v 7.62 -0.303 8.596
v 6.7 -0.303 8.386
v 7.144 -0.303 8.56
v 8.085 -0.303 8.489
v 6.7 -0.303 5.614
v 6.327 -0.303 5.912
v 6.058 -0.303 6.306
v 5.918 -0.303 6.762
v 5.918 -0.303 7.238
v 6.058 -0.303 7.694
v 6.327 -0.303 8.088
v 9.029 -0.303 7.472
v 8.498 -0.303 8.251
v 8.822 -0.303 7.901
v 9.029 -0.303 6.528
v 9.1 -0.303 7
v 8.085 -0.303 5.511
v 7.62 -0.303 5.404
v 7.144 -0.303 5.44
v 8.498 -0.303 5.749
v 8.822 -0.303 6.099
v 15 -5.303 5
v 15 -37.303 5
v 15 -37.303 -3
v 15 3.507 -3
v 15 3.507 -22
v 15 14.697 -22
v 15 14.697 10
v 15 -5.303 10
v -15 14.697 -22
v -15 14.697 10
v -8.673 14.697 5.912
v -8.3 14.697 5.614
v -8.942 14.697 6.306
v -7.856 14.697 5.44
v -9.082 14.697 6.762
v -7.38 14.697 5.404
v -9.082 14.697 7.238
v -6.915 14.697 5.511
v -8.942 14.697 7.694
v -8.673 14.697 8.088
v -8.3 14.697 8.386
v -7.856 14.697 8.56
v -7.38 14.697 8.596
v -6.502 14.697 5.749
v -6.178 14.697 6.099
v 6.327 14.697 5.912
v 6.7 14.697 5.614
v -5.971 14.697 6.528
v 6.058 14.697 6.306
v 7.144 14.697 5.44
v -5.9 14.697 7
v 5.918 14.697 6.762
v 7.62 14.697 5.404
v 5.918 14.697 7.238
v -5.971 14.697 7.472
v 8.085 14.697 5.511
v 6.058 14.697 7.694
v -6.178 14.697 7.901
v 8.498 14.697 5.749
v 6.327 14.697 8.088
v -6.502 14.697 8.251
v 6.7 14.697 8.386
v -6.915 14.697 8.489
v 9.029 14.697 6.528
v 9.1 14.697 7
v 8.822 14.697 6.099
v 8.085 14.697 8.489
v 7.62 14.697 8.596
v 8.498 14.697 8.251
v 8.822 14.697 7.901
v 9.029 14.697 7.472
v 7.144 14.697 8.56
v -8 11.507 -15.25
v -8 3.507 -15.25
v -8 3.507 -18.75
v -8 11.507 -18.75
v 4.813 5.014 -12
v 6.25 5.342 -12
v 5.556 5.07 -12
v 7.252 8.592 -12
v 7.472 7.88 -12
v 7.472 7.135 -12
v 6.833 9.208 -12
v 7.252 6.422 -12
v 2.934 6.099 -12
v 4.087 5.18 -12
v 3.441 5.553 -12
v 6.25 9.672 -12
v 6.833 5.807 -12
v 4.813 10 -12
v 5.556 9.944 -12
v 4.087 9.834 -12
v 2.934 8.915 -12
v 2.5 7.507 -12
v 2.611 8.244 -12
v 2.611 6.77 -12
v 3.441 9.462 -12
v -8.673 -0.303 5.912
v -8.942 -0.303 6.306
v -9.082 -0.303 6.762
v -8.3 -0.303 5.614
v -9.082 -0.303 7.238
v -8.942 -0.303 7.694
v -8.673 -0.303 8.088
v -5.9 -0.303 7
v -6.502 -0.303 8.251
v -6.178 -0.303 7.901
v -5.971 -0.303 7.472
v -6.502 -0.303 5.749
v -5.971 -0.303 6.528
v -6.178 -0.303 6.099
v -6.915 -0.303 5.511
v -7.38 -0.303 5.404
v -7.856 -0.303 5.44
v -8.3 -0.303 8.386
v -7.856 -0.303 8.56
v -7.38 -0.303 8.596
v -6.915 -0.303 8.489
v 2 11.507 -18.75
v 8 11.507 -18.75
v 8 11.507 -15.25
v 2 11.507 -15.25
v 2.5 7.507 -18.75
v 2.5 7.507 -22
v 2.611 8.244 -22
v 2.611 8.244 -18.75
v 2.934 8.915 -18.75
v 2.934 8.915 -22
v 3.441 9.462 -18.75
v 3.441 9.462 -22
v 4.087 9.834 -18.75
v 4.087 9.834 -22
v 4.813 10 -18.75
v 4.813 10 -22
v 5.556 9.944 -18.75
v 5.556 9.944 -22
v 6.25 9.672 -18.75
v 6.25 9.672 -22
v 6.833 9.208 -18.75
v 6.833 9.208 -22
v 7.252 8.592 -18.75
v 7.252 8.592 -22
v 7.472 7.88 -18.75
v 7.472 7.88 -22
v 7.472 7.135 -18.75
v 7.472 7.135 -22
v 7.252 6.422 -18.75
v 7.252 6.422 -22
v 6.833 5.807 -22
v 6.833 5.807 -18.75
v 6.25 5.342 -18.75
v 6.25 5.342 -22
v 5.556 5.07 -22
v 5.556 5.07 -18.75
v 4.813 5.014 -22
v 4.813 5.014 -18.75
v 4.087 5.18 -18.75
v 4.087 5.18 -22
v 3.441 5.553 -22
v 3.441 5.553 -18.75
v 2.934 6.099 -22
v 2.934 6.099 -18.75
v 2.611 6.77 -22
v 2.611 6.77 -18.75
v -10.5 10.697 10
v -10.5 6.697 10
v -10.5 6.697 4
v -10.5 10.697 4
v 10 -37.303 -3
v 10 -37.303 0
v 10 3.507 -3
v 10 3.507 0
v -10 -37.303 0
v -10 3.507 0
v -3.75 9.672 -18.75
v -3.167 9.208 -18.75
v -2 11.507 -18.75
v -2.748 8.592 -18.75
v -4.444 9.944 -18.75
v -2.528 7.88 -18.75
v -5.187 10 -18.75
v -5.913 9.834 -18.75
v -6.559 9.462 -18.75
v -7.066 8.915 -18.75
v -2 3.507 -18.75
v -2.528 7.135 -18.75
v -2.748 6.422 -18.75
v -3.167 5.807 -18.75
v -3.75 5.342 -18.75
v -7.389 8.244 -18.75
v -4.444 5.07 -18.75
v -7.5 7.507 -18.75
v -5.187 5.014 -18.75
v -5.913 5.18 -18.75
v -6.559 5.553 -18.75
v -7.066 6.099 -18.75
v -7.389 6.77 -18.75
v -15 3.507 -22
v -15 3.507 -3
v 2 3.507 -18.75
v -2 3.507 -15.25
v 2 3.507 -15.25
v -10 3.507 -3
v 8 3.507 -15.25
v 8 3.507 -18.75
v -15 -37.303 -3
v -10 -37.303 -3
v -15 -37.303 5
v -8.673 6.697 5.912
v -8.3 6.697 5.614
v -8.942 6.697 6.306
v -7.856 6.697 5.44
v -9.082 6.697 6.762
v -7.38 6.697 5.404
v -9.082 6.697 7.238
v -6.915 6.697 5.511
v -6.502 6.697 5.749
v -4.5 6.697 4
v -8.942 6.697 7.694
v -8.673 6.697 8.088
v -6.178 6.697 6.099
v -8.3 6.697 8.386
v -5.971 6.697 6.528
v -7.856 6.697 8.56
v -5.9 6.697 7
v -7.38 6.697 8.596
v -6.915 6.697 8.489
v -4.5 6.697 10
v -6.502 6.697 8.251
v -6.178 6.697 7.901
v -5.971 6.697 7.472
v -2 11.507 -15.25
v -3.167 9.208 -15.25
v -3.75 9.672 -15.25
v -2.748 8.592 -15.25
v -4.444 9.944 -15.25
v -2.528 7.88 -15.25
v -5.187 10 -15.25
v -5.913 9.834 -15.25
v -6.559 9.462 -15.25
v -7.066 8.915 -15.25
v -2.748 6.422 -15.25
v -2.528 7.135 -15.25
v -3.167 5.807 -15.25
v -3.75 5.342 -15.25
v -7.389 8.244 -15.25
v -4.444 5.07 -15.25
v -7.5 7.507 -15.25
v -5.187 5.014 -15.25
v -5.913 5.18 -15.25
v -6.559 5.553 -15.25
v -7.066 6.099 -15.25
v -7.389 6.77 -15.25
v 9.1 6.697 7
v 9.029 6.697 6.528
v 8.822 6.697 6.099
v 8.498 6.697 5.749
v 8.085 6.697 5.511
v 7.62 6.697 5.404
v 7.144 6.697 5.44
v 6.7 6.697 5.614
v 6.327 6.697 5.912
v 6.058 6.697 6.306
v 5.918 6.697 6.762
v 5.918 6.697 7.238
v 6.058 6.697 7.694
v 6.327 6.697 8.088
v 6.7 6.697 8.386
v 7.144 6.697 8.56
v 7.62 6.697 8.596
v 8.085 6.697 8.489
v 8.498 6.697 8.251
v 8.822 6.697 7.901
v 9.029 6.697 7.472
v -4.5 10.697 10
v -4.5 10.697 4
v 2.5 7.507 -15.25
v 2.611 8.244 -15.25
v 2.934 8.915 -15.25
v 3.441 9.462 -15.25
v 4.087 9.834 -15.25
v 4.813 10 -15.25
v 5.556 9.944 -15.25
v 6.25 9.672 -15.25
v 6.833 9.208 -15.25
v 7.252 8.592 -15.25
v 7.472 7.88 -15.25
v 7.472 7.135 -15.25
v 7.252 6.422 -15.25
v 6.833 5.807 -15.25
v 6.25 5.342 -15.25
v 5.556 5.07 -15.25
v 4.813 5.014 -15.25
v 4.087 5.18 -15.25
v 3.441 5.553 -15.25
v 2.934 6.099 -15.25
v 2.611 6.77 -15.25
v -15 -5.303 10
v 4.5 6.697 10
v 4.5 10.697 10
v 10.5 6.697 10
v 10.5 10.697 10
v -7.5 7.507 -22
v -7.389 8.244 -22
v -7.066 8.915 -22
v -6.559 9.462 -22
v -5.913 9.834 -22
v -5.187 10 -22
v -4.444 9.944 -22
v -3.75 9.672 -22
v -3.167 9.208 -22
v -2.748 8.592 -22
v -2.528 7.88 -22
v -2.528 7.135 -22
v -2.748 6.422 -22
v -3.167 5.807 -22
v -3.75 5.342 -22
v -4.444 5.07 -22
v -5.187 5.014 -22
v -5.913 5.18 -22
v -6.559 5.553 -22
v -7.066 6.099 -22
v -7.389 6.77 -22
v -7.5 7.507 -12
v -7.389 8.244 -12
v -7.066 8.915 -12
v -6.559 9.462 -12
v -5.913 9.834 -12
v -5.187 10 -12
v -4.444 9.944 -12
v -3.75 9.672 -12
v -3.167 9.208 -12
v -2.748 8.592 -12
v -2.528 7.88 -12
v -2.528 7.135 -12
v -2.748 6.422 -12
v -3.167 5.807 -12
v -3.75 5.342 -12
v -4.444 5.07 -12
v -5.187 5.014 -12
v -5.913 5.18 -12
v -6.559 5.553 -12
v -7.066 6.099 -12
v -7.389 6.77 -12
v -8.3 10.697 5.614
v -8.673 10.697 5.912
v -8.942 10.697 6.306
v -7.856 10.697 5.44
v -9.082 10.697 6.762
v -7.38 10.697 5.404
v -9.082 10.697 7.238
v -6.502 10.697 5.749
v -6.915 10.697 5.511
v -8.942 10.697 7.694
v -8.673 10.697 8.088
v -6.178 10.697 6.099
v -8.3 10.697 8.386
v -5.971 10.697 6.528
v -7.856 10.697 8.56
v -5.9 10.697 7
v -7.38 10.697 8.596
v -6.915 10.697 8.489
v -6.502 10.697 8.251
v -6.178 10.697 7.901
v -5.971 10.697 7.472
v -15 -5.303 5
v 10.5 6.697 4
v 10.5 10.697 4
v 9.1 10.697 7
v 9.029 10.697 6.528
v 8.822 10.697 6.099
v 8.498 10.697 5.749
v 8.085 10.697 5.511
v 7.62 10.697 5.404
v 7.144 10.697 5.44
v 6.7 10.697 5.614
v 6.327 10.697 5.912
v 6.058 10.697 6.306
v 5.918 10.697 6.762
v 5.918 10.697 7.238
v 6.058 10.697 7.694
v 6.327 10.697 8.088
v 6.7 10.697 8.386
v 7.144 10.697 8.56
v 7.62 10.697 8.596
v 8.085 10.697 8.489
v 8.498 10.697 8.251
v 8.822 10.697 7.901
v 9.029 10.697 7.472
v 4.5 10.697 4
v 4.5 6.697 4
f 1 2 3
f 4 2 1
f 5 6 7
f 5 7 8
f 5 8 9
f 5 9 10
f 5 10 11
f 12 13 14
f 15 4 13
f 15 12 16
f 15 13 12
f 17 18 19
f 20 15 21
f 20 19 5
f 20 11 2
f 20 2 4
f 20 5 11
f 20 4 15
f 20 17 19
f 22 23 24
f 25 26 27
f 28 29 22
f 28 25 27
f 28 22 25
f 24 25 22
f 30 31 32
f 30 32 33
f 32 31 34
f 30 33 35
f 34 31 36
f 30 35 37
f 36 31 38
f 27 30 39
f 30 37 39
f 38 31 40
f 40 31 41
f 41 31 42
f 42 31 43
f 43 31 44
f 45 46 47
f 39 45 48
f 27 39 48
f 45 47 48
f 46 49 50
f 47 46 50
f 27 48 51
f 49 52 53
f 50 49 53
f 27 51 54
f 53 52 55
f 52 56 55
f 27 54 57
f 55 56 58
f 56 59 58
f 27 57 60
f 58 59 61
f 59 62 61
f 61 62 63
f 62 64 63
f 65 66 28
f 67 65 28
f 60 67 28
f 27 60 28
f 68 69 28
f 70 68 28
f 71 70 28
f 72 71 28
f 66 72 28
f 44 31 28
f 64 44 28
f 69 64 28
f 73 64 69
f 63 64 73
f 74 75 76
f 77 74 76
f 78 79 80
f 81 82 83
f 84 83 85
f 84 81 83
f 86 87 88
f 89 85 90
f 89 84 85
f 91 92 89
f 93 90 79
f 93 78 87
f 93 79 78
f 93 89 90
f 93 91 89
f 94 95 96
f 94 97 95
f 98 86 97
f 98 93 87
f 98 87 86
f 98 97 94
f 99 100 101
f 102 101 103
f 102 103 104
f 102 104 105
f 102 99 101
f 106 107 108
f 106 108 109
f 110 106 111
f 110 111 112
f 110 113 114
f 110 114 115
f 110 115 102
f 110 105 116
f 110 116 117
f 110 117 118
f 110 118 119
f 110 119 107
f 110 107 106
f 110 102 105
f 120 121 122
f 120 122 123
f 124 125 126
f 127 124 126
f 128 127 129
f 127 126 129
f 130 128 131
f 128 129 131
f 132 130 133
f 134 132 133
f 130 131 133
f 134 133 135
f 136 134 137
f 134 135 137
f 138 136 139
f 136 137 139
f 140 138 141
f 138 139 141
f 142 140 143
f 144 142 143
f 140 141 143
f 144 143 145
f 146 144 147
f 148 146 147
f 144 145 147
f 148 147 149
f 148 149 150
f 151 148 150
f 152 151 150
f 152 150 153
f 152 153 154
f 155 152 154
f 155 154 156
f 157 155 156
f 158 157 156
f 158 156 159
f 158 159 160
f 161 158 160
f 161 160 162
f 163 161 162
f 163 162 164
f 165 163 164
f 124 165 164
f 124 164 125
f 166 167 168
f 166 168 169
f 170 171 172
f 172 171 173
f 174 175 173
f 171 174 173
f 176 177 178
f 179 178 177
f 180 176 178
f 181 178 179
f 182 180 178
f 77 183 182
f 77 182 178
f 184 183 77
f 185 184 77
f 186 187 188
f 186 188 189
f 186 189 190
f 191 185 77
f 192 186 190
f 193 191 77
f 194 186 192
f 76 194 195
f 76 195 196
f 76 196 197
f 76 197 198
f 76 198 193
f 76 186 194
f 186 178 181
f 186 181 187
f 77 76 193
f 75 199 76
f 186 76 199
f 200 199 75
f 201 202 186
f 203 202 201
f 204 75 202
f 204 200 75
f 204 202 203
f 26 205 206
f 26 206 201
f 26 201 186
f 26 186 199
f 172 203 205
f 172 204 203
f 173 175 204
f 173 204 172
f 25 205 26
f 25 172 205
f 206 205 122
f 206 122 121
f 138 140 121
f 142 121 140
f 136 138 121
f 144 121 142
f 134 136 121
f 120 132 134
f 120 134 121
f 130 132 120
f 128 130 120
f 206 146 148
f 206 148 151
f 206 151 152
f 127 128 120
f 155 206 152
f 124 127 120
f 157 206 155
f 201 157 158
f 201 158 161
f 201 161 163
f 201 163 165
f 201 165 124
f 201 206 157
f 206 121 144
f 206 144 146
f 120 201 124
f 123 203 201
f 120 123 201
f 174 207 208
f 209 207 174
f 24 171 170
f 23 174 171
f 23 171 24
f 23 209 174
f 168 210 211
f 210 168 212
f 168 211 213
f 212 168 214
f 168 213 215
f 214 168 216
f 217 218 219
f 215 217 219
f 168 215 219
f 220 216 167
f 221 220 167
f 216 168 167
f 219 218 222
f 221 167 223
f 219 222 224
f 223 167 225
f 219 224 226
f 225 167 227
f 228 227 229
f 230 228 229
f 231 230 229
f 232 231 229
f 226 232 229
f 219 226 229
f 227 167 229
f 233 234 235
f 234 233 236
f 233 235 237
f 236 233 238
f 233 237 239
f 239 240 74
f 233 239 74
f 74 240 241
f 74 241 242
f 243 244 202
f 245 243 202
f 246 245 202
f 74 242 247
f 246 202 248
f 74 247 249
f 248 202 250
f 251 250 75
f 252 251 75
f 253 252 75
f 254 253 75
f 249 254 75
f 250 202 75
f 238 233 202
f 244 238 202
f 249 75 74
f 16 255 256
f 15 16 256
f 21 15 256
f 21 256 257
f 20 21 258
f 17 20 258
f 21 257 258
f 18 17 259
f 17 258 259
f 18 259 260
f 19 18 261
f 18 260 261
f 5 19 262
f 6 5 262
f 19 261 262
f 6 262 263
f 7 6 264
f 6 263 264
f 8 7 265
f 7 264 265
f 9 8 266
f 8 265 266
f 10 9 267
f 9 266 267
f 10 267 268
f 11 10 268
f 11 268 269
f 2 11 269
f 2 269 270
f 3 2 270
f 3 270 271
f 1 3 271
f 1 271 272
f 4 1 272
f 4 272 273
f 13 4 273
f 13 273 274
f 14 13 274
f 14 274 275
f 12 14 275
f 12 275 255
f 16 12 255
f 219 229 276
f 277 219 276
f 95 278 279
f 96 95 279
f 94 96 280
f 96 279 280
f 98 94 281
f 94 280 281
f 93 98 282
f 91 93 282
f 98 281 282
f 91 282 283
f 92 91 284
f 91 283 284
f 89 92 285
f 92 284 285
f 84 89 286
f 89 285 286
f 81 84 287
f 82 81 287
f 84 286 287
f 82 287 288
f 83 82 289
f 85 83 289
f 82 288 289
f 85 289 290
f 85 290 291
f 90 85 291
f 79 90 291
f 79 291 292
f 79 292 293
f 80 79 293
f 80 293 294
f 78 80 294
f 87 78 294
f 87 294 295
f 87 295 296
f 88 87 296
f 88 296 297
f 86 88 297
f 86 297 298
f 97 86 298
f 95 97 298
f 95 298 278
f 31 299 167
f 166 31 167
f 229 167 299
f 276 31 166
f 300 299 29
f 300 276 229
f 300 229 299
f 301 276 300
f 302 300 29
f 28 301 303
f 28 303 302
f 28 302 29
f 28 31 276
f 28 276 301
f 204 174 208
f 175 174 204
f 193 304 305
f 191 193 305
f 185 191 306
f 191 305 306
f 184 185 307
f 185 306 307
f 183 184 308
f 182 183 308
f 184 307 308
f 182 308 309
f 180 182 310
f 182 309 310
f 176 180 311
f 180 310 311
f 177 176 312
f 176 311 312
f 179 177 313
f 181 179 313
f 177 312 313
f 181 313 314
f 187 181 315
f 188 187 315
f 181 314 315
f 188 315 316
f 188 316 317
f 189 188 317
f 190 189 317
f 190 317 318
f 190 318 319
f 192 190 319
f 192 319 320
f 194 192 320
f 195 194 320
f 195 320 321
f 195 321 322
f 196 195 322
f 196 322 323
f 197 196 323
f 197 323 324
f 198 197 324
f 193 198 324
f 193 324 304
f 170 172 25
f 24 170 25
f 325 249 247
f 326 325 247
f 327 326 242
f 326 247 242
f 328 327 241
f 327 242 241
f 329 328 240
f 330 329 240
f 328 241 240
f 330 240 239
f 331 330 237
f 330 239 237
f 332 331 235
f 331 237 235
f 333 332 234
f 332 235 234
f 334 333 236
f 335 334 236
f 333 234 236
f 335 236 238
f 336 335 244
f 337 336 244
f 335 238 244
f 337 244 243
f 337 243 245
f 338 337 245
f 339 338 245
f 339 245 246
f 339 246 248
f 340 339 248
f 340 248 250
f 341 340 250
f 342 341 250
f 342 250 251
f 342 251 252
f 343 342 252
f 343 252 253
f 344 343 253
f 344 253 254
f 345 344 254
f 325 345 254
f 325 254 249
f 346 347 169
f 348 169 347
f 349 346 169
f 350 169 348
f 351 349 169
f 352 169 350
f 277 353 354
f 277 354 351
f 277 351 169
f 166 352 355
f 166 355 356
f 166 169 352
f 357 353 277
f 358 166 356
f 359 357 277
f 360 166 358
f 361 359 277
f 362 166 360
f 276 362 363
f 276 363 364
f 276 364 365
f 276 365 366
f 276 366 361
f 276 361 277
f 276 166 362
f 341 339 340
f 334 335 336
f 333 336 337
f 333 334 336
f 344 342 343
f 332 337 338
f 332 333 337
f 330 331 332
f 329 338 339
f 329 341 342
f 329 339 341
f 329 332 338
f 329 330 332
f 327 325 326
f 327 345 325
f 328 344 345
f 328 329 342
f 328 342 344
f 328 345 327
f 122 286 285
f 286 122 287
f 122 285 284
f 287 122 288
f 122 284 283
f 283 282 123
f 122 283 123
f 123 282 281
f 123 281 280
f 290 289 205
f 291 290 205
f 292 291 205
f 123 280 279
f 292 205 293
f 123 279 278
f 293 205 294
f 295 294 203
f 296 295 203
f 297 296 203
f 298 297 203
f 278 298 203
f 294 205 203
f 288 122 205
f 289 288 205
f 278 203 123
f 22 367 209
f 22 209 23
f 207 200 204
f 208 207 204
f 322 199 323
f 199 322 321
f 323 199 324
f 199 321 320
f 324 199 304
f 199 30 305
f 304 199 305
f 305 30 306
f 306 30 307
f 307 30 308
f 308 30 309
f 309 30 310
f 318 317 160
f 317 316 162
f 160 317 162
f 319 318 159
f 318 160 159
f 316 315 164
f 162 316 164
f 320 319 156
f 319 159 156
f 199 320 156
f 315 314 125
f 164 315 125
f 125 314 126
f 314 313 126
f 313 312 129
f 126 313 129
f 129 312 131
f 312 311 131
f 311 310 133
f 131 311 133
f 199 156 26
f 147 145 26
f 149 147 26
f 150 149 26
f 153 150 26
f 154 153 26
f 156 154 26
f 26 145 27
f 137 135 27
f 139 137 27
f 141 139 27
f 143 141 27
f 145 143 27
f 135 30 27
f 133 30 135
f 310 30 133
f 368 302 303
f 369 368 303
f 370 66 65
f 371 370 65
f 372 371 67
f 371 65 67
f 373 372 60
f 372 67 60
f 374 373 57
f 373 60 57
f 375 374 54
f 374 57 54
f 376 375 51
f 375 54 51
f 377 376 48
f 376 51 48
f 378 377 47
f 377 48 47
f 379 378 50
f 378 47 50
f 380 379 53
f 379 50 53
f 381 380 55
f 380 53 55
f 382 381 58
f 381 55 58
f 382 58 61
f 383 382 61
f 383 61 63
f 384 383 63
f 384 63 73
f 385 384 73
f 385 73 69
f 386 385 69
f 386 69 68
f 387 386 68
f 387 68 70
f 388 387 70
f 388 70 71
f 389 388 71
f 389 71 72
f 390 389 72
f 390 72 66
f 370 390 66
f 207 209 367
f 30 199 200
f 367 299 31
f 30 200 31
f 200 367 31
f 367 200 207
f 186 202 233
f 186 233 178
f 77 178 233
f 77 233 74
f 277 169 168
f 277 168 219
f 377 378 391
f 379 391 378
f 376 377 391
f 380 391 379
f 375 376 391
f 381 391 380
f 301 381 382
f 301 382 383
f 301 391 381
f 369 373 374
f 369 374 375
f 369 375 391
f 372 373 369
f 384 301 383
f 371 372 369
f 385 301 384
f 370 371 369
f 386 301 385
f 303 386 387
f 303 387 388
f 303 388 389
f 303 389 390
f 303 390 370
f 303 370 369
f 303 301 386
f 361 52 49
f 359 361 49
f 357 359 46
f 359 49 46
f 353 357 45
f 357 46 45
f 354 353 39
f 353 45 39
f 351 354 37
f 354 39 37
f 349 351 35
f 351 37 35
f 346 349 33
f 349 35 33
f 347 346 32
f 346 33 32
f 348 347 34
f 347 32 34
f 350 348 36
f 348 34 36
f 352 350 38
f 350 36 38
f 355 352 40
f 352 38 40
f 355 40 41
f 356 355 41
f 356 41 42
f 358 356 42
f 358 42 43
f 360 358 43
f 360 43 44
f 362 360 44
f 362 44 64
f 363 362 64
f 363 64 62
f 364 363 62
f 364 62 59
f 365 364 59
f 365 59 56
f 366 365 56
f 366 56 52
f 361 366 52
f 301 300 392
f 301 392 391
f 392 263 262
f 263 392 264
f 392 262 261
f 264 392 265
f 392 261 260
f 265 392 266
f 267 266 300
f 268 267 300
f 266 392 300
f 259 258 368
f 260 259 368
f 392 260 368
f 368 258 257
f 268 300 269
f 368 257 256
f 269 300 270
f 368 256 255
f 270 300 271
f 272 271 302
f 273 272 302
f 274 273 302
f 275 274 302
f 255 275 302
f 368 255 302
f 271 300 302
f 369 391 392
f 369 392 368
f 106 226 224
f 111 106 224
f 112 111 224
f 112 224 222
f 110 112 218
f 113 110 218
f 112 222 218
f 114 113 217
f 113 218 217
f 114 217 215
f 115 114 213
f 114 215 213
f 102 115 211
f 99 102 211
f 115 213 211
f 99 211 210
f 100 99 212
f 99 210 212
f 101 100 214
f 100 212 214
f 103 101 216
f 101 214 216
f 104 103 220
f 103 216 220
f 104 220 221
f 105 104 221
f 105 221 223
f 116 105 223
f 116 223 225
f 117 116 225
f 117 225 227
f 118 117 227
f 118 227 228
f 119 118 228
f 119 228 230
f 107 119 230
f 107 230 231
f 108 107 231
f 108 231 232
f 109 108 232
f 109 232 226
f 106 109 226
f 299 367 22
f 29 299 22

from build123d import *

# Parameters (mm, degrees)
SKETCH_2_W          = 30
SKETCH_2_H          = 52
EXTRUDE_1_DEPTH     = 5
SKETCH_3_W          = 5
SKETCH_3_H          = 40.81
EXTRUDE_2_DEPTH     = 3
SKETCH_4_W          = 30
SKETCH_4_H          = 10
EXTRUDE_3_DEPTH     = 20
SKETCH_6_R          = 1.6
CUT_EXTRUDE_1_DEPTH = 15
SKETCH_7_W          = 6
SKETCH_7_H          = 4
CUT_EXTRUDE_2_DEPTH = 6
SKETCH_8_W          = 30
SKETCH_8_H          = 11.19
EXTRUDE_4_DEPTH     = 22
SKETCH_9_R          = 2.5
CUT_EXTRUDE_3_DEPTH = 10
SKETCH_10_W         = 6
SKETCH_10_H         = 3.5
CUT_EXTRUDE_4_DEPTH = 8


with BuildPart() as part:
    # 草图2 → 凸台-拉伸1 (new body)
    with BuildSketch(Plane.XY):
        with Locations((0, -11.302890995)):
            Rectangle(SKETCH_2_W, SKETCH_2_H)
    extrude(amount=EXTRUDE_1_DEPTH)

    # 草图3 → 凸台-拉伸2 (add)
    with BuildSketch(Plane.XY):
        with Locations((-12.5, -16.897890995)):
            Rectangle(SKETCH_3_W, SKETCH_3_H)
        with Locations((12.5, -16.897890995)):
            Rectangle(SKETCH_3_W, SKETCH_3_H)
    extrude(amount=-EXTRUDE_2_DEPTH)

    # 草图4 → 凸台-拉伸3 (add)
    with BuildSketch(Plane(origin=(0, 14.697109005, 0), x_dir=(1, 0, 0), z_dir=(0, 1, 0))):
        with Locations((0, -5)):
            Rectangle(SKETCH_4_W, SKETCH_4_H)
    extrude(amount=-EXTRUDE_3_DEPTH)

    # 草图6 → 切除-拉伸1 (cut)
    with BuildSketch(Plane(origin=(0, 14.697109005, 0), x_dir=(1, 0, 0), z_dir=(0, 1, 0))):
        with Locations((-7.5, -7)):
            Circle(SKETCH_6_R)
        with Locations((7.5, -7)):
            Circle(SKETCH_6_R)
    extrude(amount=-CUT_EXTRUDE_1_DEPTH, mode=Mode.SUBTRACT)

    # 草图7 → 切除-拉伸2 (cut)
    with BuildSketch(Plane.XY.offset(10)):
        with Locations((-7.5, 8.697109005)):
            Rectangle(SKETCH_7_W, SKETCH_7_H)
        with Locations((7.5, 8.697109005)):
            Rectangle(SKETCH_7_W, SKETCH_7_H)
    extrude(amount=-CUT_EXTRUDE_2_DEPTH, mode=Mode.SUBTRACT)

    # 草图8 → 凸台-拉伸4 (add)
    with BuildSketch(Plane.XY):
        with Locations((0, 9.102109005)):
            Rectangle(SKETCH_8_W, SKETCH_8_H)
    extrude(amount=-EXTRUDE_4_DEPTH)

    # 草图9 → 切除-拉伸3 (cut)
    with BuildSketch(Plane(origin=(0, 0, -22), x_dir=(-1, 0, 0), z_dir=(0, 0, -1))):
        with Locations((-5, 7.507109005)):
            Circle(SKETCH_9_R)
        with Locations((5, 7.507109005)):
            Circle(SKETCH_9_R)
    extrude(amount=-CUT_EXTRUDE_3_DEPTH, mode=Mode.SUBTRACT)

    # 草图10 → 切除-拉伸4 (cut)
    with BuildSketch(Plane(origin=(0, 3.507109005, 0), x_dir=(-1, 0, 0), z_dir=(0, -1, 0))):
        with Locations((5, 17)):
            Rectangle(SKETCH_10_W, SKETCH_10_H)
        with Locations((-5, 17)):
            Rectangle(SKETCH_10_W, SKETCH_10_H)
    extrude(amount=-CUT_EXTRUDE_4_DEPTH, mode=Mode.SUBTRACT)


solid = part.part
